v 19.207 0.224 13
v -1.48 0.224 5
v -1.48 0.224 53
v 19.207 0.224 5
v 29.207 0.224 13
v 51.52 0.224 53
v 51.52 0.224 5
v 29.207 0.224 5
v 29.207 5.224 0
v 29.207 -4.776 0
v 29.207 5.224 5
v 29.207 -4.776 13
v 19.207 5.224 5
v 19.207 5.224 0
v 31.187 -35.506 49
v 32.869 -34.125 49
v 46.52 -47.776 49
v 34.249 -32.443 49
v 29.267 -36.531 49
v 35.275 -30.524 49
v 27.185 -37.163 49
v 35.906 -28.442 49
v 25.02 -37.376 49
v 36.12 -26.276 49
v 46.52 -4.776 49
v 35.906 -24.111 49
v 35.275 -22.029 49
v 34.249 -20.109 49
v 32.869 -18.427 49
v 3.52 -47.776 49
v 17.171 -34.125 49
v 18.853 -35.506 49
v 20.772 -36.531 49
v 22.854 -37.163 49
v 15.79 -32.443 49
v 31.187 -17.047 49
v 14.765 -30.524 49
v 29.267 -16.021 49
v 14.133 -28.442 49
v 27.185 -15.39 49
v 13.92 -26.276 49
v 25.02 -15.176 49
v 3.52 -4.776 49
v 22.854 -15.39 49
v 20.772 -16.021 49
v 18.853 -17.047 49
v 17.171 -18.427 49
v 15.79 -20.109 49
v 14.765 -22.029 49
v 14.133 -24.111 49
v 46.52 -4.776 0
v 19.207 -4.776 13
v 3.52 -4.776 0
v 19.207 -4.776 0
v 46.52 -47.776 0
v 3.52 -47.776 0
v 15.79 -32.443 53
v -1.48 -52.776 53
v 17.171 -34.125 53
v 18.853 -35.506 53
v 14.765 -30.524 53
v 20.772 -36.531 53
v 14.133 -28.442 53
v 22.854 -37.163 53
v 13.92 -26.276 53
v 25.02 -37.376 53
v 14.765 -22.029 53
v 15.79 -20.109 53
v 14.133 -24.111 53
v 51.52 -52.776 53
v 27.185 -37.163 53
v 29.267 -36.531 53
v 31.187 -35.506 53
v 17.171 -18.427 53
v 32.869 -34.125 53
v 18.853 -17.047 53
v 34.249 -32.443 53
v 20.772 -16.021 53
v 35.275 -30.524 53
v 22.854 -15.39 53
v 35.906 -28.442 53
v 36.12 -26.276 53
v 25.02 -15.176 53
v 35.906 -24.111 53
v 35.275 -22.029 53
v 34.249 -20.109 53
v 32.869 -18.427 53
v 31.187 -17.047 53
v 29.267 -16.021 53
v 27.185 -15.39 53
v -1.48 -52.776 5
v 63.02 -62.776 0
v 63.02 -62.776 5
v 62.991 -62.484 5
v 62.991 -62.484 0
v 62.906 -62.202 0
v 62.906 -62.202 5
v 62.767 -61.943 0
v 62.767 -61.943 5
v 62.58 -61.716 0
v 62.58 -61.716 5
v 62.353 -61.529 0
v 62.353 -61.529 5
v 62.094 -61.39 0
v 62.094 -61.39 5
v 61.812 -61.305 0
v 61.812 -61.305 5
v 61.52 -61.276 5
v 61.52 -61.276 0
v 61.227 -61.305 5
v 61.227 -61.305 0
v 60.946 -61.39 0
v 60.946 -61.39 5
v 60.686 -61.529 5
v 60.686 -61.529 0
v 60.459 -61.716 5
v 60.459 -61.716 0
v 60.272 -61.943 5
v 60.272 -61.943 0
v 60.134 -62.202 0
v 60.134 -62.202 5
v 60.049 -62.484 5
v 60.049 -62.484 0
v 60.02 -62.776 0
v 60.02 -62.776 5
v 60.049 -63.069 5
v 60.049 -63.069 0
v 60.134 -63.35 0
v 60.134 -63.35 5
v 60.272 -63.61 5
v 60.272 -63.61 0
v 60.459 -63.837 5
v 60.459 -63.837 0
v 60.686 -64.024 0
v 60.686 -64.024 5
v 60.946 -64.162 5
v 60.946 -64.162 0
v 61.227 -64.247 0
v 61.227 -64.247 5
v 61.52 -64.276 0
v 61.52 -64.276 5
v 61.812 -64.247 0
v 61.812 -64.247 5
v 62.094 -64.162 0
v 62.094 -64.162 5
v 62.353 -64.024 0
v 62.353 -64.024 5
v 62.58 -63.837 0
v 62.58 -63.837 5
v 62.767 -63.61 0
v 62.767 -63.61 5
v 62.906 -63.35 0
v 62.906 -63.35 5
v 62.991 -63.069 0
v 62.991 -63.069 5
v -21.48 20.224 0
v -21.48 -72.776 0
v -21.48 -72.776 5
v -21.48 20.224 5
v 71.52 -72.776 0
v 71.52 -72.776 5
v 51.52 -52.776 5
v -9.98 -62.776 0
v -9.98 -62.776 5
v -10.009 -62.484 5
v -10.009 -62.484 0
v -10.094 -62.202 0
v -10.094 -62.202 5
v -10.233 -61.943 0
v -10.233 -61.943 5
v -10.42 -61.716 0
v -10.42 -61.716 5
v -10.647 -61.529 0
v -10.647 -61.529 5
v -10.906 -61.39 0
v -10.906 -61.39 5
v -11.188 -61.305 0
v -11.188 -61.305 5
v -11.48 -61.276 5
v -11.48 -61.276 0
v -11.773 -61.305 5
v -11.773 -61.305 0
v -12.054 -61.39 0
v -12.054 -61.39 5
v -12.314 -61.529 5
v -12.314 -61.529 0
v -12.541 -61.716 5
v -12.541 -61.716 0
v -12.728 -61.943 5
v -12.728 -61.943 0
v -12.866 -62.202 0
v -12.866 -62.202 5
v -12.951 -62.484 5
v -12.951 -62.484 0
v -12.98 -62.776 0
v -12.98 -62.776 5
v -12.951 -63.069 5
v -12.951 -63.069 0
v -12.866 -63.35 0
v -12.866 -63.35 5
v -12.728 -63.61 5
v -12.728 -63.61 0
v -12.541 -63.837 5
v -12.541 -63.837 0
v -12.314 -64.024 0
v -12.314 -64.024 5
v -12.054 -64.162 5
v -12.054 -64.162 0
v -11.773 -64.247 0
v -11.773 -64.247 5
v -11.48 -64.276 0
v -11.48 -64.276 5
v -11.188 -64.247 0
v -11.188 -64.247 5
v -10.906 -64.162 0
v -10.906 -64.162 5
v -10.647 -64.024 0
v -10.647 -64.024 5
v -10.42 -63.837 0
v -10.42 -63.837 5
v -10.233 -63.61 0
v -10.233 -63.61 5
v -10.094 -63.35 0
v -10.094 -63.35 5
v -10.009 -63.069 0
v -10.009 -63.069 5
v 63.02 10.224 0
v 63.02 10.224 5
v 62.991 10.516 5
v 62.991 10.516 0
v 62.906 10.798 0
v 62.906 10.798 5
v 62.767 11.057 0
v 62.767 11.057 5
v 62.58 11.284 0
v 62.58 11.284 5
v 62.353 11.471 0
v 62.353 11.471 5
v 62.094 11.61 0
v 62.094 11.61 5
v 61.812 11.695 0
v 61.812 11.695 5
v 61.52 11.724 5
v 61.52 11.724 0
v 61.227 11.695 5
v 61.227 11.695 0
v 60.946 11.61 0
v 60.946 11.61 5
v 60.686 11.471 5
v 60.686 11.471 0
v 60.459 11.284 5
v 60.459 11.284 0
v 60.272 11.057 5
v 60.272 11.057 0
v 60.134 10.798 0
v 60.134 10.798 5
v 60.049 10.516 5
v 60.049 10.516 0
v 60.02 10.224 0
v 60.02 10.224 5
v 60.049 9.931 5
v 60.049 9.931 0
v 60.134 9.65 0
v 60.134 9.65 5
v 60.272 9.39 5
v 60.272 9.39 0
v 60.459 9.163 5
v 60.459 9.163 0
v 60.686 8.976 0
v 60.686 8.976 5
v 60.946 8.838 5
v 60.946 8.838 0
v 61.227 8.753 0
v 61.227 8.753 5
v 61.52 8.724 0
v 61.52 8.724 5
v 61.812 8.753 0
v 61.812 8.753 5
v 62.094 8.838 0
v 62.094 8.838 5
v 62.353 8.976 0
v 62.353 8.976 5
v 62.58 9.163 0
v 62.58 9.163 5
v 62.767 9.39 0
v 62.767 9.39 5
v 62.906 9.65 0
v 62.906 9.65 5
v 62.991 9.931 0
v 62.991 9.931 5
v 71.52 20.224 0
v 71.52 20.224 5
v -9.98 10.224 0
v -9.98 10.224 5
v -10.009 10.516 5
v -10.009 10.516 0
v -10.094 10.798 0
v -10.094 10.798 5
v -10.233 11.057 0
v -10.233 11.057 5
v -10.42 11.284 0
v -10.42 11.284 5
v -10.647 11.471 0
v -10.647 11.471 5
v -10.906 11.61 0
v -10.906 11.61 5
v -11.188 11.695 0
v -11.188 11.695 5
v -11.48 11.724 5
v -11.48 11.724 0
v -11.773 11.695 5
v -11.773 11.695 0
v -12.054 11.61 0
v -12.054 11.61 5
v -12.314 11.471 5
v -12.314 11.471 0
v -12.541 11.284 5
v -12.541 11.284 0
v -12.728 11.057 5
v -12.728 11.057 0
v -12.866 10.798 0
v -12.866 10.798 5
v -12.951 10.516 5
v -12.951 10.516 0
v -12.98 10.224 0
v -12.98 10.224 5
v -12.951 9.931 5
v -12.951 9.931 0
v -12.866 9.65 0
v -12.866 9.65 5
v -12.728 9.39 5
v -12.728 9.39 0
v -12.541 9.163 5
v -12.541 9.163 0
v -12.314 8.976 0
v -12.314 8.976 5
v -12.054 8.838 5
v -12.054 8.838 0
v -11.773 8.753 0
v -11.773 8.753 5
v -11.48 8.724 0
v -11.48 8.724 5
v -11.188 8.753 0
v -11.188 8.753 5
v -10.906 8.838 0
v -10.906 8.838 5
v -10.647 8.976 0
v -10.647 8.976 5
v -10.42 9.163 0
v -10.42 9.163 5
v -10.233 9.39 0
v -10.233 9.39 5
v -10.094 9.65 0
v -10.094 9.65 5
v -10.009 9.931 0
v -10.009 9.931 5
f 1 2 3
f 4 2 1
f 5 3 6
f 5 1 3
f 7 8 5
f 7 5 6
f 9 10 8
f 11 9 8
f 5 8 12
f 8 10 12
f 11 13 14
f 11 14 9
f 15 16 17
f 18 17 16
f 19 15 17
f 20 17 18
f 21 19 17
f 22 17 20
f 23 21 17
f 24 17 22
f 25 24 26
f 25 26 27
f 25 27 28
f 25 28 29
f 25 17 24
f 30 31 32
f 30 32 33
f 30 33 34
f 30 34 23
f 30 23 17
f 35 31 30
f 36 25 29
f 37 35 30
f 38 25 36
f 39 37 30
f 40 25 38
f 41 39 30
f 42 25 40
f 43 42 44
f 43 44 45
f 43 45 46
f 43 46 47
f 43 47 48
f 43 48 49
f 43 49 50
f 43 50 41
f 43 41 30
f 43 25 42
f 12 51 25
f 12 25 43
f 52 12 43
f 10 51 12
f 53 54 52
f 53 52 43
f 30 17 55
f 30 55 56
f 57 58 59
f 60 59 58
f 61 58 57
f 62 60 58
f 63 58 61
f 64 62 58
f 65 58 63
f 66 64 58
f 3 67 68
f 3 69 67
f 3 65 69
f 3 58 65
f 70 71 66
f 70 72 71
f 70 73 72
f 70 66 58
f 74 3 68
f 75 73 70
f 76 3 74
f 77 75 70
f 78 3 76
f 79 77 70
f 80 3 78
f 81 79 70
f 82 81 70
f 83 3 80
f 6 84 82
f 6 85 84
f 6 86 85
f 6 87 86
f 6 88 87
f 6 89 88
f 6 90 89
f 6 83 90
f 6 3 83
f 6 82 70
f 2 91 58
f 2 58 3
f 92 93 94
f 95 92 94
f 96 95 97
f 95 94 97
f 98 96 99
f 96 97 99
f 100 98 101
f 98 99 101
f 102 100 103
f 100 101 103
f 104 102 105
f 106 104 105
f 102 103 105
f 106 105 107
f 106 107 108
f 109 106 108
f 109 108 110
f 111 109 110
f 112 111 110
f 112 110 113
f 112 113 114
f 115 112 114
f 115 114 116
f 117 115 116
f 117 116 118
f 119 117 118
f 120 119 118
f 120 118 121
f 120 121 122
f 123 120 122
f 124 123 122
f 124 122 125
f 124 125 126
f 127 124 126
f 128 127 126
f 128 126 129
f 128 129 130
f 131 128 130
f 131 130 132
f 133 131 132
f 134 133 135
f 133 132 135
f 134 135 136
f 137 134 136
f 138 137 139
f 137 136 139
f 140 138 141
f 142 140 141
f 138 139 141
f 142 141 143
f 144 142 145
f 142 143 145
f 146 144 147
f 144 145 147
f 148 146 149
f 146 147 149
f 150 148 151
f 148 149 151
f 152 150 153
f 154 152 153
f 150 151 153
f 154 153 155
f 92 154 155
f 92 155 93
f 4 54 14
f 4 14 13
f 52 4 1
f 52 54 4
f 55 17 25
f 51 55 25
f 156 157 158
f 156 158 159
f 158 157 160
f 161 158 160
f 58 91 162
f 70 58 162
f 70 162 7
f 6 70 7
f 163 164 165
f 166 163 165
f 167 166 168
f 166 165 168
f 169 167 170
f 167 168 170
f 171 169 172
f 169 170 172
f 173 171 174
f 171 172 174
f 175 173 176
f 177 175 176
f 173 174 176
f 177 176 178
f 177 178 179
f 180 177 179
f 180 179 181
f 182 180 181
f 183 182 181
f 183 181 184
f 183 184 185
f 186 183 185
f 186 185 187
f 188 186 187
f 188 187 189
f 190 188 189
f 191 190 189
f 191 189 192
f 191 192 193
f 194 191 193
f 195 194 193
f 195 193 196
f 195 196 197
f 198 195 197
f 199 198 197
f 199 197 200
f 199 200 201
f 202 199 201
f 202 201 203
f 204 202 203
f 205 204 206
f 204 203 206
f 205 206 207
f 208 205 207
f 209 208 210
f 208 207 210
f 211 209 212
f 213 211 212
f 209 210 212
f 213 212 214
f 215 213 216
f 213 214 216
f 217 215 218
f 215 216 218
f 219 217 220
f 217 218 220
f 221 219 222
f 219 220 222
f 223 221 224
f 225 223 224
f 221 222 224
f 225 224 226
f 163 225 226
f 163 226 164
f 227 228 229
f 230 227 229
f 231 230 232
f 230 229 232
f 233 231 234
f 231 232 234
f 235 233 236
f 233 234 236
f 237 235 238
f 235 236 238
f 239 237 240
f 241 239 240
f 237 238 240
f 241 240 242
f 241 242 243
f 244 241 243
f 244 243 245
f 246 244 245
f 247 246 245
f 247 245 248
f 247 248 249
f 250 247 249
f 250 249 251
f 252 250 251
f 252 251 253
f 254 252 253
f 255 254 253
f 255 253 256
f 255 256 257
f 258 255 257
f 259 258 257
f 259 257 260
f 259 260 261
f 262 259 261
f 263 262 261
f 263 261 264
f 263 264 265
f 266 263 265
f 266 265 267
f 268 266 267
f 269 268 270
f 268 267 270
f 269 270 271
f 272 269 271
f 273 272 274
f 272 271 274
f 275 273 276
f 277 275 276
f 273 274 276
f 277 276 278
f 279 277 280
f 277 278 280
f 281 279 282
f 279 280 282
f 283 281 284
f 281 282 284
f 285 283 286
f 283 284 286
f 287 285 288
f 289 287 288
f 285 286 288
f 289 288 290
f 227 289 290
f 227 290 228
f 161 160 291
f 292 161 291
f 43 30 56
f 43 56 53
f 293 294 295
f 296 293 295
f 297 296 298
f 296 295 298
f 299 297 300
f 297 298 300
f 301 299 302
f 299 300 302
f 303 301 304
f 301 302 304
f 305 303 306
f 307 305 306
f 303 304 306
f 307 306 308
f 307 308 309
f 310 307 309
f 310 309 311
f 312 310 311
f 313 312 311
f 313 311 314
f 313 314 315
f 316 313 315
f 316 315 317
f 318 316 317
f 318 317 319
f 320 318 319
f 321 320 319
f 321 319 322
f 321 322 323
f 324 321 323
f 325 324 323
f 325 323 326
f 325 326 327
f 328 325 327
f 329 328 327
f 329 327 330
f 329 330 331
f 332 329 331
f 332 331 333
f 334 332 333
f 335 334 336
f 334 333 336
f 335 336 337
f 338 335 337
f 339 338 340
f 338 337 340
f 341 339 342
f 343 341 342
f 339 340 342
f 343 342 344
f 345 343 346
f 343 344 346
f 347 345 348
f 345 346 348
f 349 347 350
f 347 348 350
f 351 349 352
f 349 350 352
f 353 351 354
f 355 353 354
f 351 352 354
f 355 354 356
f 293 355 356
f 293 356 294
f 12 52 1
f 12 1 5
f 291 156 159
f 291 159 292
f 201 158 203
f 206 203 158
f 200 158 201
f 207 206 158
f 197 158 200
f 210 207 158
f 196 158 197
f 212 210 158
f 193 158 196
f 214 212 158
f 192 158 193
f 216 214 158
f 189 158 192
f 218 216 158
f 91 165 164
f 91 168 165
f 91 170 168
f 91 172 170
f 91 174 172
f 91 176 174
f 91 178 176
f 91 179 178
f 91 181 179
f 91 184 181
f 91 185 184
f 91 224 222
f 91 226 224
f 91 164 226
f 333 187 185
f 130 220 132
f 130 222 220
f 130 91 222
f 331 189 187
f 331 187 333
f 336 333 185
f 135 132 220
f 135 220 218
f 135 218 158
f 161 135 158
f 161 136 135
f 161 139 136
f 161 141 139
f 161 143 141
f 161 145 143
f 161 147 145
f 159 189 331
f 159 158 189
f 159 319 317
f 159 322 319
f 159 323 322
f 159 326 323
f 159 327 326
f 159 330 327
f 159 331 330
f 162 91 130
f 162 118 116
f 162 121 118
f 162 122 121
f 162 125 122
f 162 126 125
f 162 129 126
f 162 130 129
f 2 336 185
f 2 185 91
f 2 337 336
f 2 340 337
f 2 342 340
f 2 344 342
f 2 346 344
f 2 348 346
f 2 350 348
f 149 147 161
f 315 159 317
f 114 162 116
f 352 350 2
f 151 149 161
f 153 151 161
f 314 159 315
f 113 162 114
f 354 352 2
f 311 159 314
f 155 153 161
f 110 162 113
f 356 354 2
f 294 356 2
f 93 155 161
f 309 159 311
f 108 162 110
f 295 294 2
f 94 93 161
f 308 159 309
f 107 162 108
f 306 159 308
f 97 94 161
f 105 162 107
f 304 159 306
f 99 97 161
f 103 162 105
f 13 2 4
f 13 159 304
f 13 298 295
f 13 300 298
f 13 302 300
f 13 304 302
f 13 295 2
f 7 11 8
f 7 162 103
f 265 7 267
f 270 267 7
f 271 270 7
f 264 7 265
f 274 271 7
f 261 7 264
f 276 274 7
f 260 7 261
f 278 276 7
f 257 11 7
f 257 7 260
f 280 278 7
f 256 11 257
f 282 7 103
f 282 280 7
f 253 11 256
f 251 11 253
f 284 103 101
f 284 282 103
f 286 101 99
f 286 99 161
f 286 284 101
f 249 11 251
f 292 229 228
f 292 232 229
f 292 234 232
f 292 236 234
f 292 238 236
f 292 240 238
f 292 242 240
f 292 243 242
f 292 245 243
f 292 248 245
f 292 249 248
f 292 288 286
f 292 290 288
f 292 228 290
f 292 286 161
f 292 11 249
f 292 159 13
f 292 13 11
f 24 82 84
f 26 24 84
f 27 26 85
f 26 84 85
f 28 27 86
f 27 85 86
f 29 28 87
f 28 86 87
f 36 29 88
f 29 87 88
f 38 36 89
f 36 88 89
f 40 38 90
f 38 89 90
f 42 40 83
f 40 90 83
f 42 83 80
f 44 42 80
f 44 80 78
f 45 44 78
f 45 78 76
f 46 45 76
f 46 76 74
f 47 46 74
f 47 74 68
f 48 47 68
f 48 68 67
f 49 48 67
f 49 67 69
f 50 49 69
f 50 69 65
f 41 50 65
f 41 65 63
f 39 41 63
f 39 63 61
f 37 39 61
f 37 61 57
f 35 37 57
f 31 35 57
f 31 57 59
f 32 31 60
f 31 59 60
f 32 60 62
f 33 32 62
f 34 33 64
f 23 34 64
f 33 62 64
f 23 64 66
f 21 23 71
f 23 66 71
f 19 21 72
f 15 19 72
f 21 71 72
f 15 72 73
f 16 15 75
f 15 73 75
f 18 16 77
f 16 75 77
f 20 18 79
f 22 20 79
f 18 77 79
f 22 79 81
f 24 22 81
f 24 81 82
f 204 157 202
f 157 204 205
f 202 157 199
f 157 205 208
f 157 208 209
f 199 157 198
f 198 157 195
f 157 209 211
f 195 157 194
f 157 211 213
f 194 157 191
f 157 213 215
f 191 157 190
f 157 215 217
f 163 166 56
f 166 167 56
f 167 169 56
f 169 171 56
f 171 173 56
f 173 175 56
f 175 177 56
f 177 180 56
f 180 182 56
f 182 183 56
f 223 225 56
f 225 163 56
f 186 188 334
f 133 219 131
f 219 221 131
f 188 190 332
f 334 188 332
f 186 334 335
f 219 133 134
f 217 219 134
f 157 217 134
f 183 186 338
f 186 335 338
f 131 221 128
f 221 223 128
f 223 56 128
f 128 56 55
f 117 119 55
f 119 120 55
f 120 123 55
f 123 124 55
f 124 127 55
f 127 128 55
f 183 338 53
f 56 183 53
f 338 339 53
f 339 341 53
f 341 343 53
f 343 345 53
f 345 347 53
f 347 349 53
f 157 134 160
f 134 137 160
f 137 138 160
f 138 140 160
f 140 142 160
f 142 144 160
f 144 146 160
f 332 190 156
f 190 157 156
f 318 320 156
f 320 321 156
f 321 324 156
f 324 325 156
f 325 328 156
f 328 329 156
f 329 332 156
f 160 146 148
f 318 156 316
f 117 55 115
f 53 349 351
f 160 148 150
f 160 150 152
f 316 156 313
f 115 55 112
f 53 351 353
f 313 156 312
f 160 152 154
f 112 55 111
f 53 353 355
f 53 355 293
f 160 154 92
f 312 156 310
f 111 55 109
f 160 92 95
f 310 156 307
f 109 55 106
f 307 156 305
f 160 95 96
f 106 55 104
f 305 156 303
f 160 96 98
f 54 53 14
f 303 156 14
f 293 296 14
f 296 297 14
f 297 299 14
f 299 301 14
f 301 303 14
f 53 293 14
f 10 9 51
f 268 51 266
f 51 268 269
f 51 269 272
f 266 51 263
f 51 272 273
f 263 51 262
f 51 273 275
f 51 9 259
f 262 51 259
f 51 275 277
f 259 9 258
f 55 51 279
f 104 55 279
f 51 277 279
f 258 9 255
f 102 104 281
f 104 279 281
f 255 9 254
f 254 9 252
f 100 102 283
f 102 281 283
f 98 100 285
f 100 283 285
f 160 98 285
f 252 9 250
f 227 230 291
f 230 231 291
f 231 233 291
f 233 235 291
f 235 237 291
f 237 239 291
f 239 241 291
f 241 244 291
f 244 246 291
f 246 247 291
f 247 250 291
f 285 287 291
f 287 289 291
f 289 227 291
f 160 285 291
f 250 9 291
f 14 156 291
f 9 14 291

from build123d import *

# Parameters (mm, degrees)
ESQUISSE1_W             = 93
ESQUISSE1_H             = 93
BOSS_EXTRU_1_DEPTH      = 5
ESQUISSE2_W             = 53
ESQUISSE2_H             = 53
BOSS_EXTRU_2_DEPTH      = 48
ESQUISSE3_W             = 43
ESQUISSE3_H             = 43
ENL_V_MAT_EXTRU_1_DEPTH = 49
ENL_V_MAT_EXTRU_2_REACH = 55
ESQUISSE4_R             = 11.1
ENL_V_MAT_EXTRU_3_REACH = 7
ESQUISSE5_R             = 1.5
ESQUISSE7_W             = 10
ESQUISSE7_H             = 13
ENL_V_MAT_EXTRU_4_DEPTH = 10


with BuildPart() as part:
    # Esquisse1 → Boss.-Extru.1 (new body)
    with BuildSketch(Plane.XY):
        with Locations((25.019689463, -26.276315789)):
            Rectangle(ESQUISSE1_W, ESQUISSE1_H)
    extrude(amount=BOSS_EXTRU_1_DEPTH)

    # Esquisse2 → Boss.-Extru.2 (add)
    with BuildSketch(Plane.XY.offset(5)):
        with Locations((25.01969205, -26.276318376)):
            Rectangle(ESQUISSE2_W, ESQUISSE2_H)
    extrude(amount=BOSS_EXTRU_2_DEPTH)

    # Esquisse3 → Enlèv. mat.-Extru.1 (cut)
    with BuildSketch(Plane(origin=(0, 0, 0), x_dir=(-1, 0, 0), z_dir=(0, 0, -1))):
        with Locations((-25.019689463, -26.276315789)):
            Rectangle(ESQUISSE3_W, ESQUISSE3_H)
    extrude(amount=-ENL_V_MAT_EXTRU_1_DEPTH, mode=Mode.SUBTRACT)

    # Esquisse4 → Enlèv. mat.-Extru.2 (cut, up to next)
    with BuildSketch(Plane.XY.offset(53), mode=Mode.PRIVATE) as enl_v_mat_extru_2_sk1:
        with Locations((25.01969205, -26.276318376)):
            Circle(ESQUISSE4_R)
    enl_v_mat_extru_2_tool1 = extrude(enl_v_mat_extru_2_sk1.sketch, amount=-ENL_V_MAT_EXTRU_2_REACH, mode=Mode.PRIVATE) & part.part
    add(enl_v_mat_extru_2_tool1.solids().sort_by_distance((25.019692, -26.276318, 53))[0], mode=Mode.SUBTRACT)

    # Esquisse5 → Enlèv. mat.-Extru.3 (cut, up to next)
    with BuildSketch(Plane.XY.offset(5), mode=Mode.PRIVATE) as enl_v_mat_extru_3_sk1:
        with Locations((61.519689463, -62.776315789)):
            Circle(ESQUISSE5_R)
    enl_v_mat_extru_3_tool1 = extrude(enl_v_mat_extru_3_sk1.sketch, amount=-ENL_V_MAT_EXTRU_3_REACH, mode=Mode.PRIVATE) & part.part
    add(enl_v_mat_extru_3_tool1.solids().sort_by_distance((61.519689, -62.776316, 5))[0], mode=Mode.SUBTRACT)
    # Esquisse5 → Enlèv. mat.-Extru.3 (cut, up to next)
    with BuildSketch(Plane.XY.offset(5), mode=Mode.PRIVATE) as enl_v_mat_extru_3_sk2:
        with Locations((-11.480310537, -62.776315789)):
            Circle(ESQUISSE5_R)
    enl_v_mat_extru_3_tool2 = extrude(enl_v_mat_extru_3_sk2.sketch, amount=-ENL_V_MAT_EXTRU_3_REACH, mode=Mode.PRIVATE) & part.part
    add(enl_v_mat_extru_3_tool2.solids().sort_by_distance((-11.480311, -62.776316, 5))[0], mode=Mode.SUBTRACT)
    # Esquisse5 → Enlèv. mat.-Extru.3 (cut, up to next)
    with BuildSketch(Plane.XY.offset(5), mode=Mode.PRIVATE) as enl_v_mat_extru_3_sk3:
        with Locations((-11.480310537, 10.223684211)):
            Circle(ESQUISSE5_R)
    enl_v_mat_extru_3_tool3 = extrude(enl_v_mat_extru_3_sk3.sketch, amount=-ENL_V_MAT_EXTRU_3_REACH, mode=Mode.PRIVATE) & part.part
    add(enl_v_mat_extru_3_tool3.solids().sort_by_distance((-11.480311, 10.223684, 5))[0], mode=Mode.SUBTRACT)
    # Esquisse5 → Enlèv. mat.-Extru.3 (cut, up to next)
    with BuildSketch(Plane.XY.offset(5), mode=Mode.PRIVATE) as enl_v_mat_extru_3_sk4:
        with Locations((61.519689463, 10.223684211)):
            Circle(ESQUISSE5_R)
    enl_v_mat_extru_3_tool4 = extrude(enl_v_mat_extru_3_sk4.sketch, amount=-ENL_V_MAT_EXTRU_3_REACH, mode=Mode.PRIVATE) & part.part
    add(enl_v_mat_extru_3_tool4.solids().sort_by_distance((61.519689, 10.223684, 5))[0], mode=Mode.SUBTRACT)

    # Esquisse7 → Enlèv. mat.-Extru.4 (cut)
    with BuildSketch(Plane.XZ.offset(4.776315789)):
        with Locations((24.207318305, 6.5)):
            Rectangle(ESQUISSE7_W, ESQUISSE7_H)
    extrude(amount=-ENL_V_MAT_EXTRU_4_DEPTH, mode=Mode.SUBTRACT)


solid = part.part
